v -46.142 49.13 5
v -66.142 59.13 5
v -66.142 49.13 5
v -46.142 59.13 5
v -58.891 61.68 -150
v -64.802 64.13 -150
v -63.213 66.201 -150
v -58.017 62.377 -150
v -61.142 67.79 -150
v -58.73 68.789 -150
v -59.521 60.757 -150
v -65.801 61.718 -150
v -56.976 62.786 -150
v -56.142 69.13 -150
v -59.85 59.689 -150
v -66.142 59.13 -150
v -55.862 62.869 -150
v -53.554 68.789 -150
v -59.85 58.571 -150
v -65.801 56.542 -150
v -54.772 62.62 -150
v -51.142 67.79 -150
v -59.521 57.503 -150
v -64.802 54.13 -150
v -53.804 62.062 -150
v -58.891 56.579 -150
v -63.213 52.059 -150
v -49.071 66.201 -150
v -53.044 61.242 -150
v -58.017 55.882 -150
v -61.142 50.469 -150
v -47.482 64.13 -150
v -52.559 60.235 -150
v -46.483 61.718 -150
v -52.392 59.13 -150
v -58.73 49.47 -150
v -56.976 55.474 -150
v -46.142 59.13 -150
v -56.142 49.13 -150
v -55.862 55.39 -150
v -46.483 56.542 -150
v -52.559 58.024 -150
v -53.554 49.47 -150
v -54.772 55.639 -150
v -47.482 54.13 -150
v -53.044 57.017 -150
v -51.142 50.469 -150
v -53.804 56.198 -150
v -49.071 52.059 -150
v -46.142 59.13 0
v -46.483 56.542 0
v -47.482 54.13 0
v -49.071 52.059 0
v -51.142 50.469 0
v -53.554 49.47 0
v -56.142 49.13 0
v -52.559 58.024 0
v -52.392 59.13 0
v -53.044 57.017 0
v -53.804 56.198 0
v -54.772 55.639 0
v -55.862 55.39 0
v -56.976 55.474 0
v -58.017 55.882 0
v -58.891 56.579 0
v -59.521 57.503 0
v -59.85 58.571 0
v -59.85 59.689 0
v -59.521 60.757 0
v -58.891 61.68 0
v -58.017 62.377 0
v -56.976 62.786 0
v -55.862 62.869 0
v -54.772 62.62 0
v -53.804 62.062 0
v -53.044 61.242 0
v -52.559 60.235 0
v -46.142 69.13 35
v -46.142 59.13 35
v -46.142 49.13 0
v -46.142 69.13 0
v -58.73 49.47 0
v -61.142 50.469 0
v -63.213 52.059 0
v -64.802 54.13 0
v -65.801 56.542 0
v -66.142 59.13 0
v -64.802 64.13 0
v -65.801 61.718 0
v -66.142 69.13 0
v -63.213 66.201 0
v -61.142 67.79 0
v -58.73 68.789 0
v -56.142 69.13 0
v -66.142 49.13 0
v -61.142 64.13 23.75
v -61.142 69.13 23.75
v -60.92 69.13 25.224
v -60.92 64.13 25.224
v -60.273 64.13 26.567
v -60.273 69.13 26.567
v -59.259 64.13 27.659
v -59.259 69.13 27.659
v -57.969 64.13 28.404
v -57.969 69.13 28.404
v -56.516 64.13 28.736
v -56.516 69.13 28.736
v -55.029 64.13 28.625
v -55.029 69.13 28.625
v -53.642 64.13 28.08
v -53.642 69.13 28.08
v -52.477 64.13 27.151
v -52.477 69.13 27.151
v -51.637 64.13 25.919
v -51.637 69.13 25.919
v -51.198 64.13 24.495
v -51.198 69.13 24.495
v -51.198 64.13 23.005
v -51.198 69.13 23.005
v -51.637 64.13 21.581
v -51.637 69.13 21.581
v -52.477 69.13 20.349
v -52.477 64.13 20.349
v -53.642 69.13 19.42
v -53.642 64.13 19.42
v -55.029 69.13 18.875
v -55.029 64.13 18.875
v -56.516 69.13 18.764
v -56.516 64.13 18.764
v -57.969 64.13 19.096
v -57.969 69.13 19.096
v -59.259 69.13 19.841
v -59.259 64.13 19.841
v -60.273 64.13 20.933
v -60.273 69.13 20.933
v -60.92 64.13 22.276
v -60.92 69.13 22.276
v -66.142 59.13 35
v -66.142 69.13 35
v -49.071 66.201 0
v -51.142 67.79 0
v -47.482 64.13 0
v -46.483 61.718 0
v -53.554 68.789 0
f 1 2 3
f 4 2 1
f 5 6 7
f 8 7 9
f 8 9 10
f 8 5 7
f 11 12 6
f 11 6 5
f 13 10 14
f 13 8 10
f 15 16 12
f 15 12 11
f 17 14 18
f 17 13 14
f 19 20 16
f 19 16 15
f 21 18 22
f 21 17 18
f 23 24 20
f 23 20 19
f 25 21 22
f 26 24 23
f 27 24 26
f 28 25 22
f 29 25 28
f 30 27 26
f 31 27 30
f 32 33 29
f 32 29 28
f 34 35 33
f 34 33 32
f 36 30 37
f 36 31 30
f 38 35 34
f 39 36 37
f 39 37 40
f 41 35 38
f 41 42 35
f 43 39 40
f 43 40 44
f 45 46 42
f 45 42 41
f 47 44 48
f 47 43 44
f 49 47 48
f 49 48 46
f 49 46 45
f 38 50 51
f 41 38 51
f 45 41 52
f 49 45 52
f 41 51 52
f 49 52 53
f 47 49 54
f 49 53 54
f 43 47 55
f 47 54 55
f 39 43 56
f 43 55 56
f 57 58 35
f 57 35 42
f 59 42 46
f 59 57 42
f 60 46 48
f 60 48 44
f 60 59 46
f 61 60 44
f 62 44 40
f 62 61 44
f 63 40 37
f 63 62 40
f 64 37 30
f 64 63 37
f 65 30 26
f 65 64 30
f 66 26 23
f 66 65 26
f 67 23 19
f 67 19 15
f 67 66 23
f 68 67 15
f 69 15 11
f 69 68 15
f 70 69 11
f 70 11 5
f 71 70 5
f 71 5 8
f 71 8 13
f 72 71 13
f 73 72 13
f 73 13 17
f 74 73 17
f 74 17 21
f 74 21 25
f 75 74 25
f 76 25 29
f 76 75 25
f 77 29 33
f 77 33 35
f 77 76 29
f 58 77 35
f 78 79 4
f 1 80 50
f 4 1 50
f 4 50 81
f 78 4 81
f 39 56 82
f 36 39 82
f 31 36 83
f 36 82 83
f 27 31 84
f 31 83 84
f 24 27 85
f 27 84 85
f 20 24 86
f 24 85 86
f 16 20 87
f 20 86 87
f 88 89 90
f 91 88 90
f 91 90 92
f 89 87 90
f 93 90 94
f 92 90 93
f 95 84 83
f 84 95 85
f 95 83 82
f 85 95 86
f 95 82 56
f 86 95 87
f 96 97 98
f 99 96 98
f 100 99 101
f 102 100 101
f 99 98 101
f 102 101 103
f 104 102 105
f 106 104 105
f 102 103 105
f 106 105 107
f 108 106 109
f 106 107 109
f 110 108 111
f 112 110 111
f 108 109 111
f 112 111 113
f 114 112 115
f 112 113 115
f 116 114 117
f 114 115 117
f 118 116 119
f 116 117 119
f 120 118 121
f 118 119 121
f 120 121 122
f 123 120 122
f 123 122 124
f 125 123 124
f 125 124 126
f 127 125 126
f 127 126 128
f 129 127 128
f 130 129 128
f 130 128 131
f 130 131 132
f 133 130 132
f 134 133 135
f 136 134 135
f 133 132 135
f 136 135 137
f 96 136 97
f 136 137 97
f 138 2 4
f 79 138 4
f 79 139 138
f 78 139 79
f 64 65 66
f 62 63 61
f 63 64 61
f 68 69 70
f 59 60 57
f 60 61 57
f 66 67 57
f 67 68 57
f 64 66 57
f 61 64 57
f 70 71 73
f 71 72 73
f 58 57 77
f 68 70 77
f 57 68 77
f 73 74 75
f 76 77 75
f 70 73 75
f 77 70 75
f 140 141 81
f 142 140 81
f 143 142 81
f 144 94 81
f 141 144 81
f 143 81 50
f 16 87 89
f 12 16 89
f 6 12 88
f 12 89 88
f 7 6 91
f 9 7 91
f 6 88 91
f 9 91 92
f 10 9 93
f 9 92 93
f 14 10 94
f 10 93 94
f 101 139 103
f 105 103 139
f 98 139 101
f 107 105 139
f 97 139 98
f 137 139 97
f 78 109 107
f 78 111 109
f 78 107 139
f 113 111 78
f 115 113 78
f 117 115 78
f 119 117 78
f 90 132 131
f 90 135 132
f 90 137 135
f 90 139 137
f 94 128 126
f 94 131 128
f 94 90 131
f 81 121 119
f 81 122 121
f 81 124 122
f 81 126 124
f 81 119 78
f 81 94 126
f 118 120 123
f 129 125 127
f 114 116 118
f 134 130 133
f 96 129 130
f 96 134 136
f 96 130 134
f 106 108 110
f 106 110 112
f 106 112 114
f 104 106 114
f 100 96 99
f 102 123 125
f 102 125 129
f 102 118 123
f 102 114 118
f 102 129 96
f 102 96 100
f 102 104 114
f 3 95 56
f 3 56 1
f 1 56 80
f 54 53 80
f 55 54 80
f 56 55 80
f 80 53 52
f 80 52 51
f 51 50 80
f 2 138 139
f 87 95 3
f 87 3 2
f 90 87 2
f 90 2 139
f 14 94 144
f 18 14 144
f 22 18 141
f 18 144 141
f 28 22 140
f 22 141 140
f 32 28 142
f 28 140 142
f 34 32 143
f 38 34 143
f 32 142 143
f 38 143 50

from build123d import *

# Parameters (mm, degrees)
F0_W     = 20
F0_H     = 20
F1_DEPTH = 5
F2_R     = 3.75
F3_DEPTH = 150
F4_W     = 20
F4_H     = 10
F5_DEPTH = 30
F6_R     = 5
F7_DEPTH = 5


with BuildPart() as f1:
    # F0 (on Top) → F1 (new body)
    with BuildSketch(Plane.XY):
        with Locations((-56.141918, 59.129702)):
            Rectangle(F0_W, F0_H)
    extrude(amount=F1_DEPTH)

    # F2 (on face) → F3 (join)
    with BuildSketch(Plane(origin=(0, 0, 0), x_dir=(1, 0, 0), z_dir=(0, 0, -1))):
        with BuildLine():
            ThreePointArc((-56.141918, -69.129702), (-49.07085, -66.20077), (-46.141918, -59.129702))
            ThreePointArc((-46.141918, -59.129702), (-49.07085, -52.058634), (-56.141918, -49.129702))
            ThreePointArc((-56.141918, -49.129702), (-63.212986, -52.058634), (-66.141918, -59.129702))
            ThreePointArc((-66.141918, -59.129702), (-63.212986, -66.20077), (-56.141918, -69.129702))
        make_face()
        with Locations((-56.141918, -59.129702)):
            Circle(F2_R, mode=Mode.SUBTRACT)
    extrude(amount=F3_DEPTH)

    # F4 (on face) → F5 (join)
    with BuildSketch(Plane.XY.offset(5)):
        with Locations((-56.141918, 64.129702)):
            Rectangle(F4_W, F4_H)
    extrude(amount=F5_DEPTH)

    # F6 (on face) → F7 (cut)
    with BuildSketch(Plane(origin=(0, 69.129702, 0), x_dir=(-1, 0, 0), z_dir=(0, 1, 0))):
        with Locations((56.141918, 23.75)):
            Circle(F6_R)
    extrude(amount=-F7_DEPTH, mode=Mode.SUBTRACT)


solid = f1.part
